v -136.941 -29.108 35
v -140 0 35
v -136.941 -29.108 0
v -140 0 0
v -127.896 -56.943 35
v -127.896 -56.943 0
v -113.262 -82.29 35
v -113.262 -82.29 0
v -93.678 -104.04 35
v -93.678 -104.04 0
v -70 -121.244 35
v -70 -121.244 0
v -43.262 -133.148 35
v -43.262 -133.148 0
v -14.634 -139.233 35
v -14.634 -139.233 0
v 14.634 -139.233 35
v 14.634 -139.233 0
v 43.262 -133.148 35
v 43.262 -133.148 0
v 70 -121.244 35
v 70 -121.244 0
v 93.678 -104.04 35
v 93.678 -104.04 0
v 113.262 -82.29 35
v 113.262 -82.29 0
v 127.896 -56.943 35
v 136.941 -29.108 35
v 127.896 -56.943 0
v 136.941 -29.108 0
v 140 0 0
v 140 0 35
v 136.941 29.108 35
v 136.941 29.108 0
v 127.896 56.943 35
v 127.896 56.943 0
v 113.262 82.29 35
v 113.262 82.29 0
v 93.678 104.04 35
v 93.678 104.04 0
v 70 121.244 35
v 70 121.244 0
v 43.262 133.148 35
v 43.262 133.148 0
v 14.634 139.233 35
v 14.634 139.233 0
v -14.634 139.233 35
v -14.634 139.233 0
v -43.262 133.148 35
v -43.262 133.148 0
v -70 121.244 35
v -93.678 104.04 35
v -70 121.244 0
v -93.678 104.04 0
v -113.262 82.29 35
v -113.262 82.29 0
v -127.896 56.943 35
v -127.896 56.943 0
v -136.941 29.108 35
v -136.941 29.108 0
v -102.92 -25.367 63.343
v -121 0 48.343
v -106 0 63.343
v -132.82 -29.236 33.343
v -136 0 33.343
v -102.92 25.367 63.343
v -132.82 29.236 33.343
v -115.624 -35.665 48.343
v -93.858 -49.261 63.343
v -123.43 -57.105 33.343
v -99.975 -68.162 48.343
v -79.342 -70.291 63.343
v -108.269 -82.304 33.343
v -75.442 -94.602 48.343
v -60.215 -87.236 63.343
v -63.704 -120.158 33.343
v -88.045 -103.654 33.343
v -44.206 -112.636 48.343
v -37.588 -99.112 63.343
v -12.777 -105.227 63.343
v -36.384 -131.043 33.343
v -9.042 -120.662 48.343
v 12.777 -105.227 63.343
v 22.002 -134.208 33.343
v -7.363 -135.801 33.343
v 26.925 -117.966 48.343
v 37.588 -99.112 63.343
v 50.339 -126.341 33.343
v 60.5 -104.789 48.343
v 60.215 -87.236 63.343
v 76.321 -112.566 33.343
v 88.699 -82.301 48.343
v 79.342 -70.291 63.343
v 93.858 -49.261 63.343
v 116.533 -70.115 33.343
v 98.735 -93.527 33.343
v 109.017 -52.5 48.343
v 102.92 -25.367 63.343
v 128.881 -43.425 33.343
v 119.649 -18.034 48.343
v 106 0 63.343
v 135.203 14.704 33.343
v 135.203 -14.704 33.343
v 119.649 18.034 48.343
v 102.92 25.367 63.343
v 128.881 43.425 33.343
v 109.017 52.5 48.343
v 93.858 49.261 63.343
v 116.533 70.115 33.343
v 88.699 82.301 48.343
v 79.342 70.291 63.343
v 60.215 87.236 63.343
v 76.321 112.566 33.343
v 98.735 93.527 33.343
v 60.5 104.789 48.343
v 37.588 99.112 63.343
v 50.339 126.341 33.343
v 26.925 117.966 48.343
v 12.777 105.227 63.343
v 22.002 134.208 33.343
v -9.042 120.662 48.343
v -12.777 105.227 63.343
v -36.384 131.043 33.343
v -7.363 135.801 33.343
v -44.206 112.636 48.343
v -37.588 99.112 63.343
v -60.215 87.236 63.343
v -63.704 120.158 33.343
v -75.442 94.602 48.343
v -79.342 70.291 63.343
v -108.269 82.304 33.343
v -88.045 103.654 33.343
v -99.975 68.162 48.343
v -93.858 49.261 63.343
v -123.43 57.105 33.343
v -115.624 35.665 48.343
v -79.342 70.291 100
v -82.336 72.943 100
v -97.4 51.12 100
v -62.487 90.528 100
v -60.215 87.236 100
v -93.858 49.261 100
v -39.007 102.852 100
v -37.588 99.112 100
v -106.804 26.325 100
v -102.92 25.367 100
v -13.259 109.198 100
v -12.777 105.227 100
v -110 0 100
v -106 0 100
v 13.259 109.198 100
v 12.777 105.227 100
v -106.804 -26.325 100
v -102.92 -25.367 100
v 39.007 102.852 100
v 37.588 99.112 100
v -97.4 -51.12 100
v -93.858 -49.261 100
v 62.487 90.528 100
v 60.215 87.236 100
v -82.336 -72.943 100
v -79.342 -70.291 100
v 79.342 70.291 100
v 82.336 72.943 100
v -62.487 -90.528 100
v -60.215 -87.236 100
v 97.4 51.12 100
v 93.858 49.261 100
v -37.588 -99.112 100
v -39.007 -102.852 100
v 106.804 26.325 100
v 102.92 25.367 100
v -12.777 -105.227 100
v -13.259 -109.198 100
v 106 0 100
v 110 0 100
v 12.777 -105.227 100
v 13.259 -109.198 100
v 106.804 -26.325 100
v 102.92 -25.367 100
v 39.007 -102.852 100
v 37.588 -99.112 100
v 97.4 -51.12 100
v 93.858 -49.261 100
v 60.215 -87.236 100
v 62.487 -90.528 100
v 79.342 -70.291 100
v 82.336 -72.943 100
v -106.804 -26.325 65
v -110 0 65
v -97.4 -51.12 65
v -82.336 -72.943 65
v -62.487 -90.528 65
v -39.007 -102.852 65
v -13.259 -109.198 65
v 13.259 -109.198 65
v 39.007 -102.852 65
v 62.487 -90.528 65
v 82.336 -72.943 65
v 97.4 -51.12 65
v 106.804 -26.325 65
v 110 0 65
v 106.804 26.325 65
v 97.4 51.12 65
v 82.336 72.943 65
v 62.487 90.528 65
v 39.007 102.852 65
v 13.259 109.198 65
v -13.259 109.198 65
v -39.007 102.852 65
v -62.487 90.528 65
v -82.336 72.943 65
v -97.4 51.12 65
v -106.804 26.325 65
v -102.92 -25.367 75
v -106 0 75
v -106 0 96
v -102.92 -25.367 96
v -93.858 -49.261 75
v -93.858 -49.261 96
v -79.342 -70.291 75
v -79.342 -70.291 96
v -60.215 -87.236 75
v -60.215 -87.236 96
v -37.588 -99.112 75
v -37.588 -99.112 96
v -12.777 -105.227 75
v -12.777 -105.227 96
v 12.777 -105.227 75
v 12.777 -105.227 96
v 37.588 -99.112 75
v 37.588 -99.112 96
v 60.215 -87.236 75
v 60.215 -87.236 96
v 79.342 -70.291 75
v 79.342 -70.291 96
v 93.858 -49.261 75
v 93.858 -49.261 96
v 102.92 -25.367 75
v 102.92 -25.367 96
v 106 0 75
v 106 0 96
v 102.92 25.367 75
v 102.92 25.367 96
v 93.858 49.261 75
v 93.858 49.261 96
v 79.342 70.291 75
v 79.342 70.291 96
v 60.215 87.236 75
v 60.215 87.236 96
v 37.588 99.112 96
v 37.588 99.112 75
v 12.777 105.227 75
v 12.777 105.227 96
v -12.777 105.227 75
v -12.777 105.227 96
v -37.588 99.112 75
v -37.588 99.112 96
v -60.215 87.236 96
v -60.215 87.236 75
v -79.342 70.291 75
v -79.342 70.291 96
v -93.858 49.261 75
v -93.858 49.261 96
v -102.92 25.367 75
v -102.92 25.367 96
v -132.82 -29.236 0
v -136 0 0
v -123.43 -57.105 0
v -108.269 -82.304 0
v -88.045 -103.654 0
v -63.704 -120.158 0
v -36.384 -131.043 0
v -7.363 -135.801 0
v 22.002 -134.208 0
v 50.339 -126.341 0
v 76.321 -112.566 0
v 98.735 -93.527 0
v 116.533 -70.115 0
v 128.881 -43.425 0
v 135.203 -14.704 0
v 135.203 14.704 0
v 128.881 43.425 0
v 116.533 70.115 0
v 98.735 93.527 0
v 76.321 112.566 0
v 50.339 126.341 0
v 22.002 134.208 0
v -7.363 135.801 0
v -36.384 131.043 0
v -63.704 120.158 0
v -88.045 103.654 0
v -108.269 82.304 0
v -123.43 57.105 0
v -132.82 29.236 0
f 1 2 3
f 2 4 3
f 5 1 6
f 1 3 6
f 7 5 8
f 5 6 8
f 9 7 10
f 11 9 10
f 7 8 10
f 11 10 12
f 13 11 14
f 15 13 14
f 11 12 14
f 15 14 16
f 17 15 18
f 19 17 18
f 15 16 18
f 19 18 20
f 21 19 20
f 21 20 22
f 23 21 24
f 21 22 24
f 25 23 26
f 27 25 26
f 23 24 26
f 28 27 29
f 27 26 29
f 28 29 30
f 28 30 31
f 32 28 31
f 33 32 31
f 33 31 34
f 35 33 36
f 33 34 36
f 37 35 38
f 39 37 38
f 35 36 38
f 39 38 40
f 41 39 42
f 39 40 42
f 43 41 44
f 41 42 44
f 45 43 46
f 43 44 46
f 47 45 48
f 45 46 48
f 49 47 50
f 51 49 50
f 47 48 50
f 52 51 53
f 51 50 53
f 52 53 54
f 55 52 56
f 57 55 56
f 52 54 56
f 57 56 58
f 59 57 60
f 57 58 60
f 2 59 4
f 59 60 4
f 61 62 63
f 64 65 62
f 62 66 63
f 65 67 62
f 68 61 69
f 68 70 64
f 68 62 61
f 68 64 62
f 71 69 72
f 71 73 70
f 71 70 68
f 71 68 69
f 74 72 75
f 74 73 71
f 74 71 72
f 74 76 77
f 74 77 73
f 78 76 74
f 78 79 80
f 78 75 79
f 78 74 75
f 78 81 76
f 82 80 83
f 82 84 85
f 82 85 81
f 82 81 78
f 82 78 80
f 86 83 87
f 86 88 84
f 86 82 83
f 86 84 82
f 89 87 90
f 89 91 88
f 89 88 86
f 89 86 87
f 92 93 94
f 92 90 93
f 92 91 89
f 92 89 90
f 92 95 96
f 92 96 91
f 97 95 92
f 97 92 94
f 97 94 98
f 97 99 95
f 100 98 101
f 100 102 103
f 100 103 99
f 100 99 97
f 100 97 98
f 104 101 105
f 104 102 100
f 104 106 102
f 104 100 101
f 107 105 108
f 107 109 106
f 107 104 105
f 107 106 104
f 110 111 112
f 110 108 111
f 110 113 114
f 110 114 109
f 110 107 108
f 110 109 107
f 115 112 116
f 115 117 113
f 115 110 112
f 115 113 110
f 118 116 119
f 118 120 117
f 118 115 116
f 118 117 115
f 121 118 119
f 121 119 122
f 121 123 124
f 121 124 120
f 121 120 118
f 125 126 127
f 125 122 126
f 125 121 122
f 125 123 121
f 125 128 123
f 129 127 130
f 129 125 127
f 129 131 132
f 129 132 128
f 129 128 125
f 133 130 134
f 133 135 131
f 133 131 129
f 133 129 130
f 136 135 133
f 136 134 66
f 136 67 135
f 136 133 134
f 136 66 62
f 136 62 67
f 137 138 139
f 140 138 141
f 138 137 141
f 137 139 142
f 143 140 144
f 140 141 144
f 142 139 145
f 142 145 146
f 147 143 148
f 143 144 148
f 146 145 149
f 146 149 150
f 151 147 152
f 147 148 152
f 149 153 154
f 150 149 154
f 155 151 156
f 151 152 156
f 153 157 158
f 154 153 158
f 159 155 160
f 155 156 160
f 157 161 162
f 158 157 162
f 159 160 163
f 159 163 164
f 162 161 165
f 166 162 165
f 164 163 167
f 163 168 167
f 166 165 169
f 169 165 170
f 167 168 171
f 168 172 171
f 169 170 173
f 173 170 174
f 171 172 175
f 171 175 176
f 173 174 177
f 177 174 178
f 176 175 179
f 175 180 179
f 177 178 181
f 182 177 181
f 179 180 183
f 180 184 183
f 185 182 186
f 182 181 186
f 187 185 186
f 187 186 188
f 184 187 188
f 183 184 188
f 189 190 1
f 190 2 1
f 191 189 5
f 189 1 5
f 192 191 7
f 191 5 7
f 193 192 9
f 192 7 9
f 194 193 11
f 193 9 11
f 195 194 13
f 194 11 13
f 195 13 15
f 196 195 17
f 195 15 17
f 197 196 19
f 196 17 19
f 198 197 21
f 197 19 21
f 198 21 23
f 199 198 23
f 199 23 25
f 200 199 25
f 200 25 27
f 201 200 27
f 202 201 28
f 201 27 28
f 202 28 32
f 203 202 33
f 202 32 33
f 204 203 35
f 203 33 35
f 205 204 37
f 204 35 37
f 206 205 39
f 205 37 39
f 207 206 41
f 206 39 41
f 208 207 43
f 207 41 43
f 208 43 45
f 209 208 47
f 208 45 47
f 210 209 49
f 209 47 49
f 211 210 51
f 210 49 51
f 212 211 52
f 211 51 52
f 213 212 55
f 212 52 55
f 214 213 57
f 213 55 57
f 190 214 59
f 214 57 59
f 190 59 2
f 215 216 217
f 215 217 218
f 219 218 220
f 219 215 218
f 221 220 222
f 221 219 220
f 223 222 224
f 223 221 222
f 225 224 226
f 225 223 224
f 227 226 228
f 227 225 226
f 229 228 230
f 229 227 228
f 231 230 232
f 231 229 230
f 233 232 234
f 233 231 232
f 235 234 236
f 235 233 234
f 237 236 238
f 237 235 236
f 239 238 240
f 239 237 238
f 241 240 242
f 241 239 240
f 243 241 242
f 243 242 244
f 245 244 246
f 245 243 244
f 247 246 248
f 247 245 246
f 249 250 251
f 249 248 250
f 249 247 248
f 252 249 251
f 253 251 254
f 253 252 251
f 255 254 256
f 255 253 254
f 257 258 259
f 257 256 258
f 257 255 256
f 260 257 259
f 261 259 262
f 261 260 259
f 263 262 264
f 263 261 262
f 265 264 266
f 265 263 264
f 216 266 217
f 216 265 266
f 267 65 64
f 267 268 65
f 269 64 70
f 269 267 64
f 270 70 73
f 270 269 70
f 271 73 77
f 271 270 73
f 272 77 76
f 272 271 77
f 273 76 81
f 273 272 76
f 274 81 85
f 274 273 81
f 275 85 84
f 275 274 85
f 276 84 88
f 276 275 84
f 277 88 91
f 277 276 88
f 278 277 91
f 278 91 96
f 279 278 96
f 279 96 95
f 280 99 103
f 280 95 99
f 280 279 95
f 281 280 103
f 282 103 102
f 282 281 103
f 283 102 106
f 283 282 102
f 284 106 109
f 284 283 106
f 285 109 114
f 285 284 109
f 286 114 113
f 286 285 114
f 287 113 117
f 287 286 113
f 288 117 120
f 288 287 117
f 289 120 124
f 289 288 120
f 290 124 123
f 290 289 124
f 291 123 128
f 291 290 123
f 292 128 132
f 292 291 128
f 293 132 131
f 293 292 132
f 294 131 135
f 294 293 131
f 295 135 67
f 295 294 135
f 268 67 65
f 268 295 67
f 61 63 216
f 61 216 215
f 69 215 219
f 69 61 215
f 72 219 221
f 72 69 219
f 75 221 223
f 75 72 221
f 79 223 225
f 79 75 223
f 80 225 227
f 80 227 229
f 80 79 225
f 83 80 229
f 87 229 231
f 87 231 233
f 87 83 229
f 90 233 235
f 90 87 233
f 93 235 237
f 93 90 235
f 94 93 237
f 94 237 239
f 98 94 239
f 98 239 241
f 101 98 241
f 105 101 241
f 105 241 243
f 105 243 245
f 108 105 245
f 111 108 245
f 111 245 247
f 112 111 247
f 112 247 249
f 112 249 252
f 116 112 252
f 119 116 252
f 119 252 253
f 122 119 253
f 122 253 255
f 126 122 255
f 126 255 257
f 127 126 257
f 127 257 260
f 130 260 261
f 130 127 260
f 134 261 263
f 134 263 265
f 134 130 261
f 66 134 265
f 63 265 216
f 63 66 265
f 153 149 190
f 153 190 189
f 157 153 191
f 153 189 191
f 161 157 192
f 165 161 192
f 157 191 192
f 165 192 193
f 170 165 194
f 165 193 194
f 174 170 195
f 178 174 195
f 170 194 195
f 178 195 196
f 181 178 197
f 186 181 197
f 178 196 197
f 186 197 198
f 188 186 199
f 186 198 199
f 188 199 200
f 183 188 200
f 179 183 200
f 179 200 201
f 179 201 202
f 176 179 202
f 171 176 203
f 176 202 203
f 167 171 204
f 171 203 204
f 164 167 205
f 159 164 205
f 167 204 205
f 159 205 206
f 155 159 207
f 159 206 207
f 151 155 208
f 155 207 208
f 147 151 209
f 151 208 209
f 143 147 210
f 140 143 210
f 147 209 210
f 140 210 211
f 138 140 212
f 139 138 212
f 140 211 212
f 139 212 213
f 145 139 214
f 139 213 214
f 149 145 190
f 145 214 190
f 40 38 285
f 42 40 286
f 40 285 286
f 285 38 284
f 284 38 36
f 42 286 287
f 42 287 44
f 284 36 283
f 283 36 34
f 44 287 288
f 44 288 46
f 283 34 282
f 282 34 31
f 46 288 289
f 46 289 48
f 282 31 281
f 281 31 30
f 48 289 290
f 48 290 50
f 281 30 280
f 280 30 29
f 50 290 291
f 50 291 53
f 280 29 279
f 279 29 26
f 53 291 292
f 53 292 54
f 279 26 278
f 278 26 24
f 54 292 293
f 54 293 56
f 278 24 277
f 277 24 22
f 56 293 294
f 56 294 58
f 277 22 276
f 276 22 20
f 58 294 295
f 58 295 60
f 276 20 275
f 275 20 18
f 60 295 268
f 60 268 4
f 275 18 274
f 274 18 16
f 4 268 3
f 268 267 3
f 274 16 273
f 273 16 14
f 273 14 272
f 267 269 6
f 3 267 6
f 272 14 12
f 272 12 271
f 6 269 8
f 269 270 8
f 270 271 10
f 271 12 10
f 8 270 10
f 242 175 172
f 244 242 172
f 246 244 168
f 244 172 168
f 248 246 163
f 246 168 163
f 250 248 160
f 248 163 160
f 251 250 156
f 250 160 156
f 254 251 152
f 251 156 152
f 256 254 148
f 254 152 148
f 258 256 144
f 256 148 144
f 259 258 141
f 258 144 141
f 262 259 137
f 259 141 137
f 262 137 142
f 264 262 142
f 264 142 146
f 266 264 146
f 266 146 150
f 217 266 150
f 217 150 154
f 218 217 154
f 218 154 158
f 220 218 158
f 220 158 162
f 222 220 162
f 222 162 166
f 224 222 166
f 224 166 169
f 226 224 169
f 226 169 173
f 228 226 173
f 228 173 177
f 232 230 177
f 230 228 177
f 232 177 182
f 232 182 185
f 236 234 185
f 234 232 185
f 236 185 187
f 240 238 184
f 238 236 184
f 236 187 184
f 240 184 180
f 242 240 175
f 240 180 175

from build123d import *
from build123d import SkipClean  # not in build123d's __all__

# Parameters (mm, degrees)
F2_T     = -4
F3_R     = 106
F4_DEPTH = 25


with BuildPart() as f1:
    # F0 (on Front) → F1 (revolve)
    with BuildSketch(Plane.XZ):
        Polygon((-140, 35), (-140, 0), (0, 0), (0, 100), (-110, 100), (-110, 65), align=None)
    revolve(axis=Axis((0, 0, 50), (0, 0, 1)))

    # F2
    f2_openings = [f1.faces().sort_by_distance(p)[0] for p in [
        (0, 0, 0),
    ]]
    offset(amount=F2_T, openings=f2_openings, kind=Kind.INTERSECTION)

    # F3 (on face) → F4 (cut)
    with BuildSketch(Plane.XY.offset(100)):
        Circle(F3_R)
    with SkipClean():  # cleaning this boolean's faces spoils the solid; the shape is the same uncleaned
        extrude(amount=-F4_DEPTH, mode=Mode.SUBTRACT)


solid = f1.part
